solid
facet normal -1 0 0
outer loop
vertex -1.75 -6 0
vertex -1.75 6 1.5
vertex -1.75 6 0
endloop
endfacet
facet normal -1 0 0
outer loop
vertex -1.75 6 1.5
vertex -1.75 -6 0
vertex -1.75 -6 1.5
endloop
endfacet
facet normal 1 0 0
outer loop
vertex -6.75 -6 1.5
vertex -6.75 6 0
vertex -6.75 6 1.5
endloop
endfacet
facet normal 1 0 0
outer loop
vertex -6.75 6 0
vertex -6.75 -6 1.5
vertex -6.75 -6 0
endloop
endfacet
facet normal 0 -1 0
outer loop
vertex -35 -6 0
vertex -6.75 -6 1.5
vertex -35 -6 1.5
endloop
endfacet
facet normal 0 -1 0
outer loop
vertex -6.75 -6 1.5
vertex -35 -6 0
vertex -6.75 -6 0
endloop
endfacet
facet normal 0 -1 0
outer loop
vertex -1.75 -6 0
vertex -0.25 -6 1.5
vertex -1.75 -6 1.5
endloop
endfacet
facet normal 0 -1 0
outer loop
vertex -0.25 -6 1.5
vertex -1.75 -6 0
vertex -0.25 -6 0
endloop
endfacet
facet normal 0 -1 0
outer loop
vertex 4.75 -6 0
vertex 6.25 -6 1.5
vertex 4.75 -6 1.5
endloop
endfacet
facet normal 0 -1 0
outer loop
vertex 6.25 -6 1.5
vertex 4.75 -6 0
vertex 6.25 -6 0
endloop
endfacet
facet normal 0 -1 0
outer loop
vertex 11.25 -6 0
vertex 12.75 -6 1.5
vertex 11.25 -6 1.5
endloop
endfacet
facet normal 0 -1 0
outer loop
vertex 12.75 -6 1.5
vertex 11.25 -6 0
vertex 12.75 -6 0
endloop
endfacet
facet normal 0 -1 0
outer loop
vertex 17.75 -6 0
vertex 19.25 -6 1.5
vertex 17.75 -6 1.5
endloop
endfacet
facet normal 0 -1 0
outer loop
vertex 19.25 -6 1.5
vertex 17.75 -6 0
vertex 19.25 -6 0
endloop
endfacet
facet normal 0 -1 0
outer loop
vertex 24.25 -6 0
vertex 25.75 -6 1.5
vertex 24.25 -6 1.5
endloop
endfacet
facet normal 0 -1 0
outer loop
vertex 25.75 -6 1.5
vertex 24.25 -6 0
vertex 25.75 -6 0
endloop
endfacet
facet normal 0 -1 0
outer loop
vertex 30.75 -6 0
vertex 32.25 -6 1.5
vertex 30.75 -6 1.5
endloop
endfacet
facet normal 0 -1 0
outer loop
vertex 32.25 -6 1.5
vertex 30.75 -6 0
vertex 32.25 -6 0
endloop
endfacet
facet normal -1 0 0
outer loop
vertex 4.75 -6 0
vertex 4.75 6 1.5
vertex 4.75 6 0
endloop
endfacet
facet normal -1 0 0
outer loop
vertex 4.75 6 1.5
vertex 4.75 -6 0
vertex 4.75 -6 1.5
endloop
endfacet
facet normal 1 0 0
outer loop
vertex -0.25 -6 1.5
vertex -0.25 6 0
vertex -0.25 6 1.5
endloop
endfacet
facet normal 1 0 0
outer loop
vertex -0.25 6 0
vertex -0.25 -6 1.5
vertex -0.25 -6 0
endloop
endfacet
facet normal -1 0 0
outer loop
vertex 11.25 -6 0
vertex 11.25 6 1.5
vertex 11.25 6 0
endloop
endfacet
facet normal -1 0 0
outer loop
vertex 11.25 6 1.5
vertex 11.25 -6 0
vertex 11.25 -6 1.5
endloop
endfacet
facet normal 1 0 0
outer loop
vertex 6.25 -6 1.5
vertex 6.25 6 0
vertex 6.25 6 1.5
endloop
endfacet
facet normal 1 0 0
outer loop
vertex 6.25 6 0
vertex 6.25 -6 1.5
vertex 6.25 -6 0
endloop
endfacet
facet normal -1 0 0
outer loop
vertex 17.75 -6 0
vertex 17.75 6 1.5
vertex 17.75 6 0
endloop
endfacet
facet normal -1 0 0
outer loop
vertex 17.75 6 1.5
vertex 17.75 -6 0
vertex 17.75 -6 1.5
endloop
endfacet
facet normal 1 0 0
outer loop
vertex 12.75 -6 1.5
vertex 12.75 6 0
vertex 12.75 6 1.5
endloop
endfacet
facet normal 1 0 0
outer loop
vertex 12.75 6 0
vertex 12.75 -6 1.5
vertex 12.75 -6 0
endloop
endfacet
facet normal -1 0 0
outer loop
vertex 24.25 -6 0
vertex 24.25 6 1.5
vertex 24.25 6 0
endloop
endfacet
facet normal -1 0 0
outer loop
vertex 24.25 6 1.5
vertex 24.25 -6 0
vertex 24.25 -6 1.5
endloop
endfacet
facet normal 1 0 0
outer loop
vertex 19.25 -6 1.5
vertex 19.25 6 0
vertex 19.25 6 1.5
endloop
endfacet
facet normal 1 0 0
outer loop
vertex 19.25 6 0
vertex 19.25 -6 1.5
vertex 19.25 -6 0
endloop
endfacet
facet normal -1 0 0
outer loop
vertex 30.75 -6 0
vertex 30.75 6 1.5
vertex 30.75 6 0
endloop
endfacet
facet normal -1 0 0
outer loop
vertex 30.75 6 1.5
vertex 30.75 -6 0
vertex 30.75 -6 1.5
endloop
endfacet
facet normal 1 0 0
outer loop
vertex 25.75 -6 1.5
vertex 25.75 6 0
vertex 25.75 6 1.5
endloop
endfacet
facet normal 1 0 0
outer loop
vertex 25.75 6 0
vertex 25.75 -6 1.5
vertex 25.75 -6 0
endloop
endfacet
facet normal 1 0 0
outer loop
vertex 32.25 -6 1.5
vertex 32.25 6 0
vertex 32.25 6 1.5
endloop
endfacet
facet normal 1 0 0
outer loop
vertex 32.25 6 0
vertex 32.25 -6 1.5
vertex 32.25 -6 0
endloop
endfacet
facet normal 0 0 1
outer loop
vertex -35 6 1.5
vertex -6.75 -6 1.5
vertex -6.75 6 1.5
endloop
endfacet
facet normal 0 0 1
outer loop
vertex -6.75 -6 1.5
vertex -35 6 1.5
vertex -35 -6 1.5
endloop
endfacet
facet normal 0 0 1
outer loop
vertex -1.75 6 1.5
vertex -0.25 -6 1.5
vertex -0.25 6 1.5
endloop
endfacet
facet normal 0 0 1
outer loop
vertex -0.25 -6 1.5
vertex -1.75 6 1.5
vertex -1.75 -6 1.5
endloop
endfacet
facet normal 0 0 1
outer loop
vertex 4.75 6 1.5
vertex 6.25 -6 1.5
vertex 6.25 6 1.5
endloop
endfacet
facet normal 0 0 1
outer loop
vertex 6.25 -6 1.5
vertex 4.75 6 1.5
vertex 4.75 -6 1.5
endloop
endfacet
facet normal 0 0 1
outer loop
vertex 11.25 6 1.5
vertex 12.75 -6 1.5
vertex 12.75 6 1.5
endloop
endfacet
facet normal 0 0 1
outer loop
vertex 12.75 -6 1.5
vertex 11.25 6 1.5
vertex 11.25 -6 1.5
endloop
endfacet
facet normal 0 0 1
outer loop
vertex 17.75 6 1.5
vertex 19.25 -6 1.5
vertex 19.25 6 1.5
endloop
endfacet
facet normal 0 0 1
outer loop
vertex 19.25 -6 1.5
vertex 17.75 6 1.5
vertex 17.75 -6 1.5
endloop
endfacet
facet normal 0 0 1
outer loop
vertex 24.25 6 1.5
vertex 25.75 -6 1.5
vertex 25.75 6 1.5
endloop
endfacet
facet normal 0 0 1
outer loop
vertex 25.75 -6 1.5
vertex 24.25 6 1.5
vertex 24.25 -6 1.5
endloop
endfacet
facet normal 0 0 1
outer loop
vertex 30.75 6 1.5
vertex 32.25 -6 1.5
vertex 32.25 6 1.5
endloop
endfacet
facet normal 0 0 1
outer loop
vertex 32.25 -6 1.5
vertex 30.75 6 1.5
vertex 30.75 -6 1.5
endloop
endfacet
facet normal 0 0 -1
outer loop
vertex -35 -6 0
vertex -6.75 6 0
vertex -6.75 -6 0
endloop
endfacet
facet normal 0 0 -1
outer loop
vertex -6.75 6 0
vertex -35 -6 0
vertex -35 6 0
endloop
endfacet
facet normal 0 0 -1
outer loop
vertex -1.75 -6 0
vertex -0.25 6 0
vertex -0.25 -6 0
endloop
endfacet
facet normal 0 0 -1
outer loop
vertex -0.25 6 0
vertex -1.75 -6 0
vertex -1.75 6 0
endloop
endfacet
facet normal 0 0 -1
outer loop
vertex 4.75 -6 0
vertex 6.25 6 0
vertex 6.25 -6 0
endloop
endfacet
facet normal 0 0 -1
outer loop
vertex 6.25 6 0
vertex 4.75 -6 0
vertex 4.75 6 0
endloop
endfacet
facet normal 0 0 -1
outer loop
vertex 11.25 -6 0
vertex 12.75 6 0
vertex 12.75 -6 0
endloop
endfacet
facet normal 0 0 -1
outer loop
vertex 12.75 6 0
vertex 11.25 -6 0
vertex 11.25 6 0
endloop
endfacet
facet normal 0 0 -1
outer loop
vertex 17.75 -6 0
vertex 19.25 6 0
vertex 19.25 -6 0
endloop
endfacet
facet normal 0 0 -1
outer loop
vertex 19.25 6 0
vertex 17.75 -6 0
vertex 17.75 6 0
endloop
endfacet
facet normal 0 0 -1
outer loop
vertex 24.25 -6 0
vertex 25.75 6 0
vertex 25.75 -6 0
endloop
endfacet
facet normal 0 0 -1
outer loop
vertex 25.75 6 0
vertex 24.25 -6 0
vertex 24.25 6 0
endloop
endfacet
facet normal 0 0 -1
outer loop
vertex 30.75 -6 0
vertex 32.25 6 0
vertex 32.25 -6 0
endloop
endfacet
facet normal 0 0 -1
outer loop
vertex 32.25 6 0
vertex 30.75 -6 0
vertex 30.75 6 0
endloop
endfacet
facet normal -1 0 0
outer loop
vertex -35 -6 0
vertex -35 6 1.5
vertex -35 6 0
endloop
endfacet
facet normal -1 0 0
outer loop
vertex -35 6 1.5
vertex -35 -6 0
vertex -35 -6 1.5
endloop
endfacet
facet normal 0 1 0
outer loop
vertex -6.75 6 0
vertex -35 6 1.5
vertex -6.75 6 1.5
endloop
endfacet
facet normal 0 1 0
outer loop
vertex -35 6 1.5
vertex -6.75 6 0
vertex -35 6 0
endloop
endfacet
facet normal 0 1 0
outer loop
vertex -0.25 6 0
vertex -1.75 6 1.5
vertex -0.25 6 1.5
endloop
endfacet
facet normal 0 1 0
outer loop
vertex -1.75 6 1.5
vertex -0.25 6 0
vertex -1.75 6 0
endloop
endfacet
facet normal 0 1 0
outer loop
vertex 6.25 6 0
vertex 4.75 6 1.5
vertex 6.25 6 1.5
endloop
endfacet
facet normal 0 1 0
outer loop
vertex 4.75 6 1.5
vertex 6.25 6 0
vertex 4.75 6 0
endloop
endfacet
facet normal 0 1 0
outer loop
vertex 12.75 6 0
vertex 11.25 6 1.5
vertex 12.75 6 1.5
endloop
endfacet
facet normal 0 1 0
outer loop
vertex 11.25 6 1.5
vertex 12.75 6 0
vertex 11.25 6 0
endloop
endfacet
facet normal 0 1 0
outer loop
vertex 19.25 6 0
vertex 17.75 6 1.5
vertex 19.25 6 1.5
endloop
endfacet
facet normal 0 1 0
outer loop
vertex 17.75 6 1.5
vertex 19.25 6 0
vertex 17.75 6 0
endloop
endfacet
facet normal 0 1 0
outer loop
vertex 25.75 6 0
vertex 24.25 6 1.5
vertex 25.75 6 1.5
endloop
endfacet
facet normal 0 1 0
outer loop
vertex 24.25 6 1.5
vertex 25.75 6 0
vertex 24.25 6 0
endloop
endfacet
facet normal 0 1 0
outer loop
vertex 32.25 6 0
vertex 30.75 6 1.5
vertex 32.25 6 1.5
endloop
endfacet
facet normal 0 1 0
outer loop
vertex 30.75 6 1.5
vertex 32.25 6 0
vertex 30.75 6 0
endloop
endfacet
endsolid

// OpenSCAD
// 10-well comb for casting agarose gels, printed lying flat
// Units: mm. Print orientation: flat on bed, teeth pointing -Y.

// ---------- Parameters ----------
spine_len      = 70;    // spine (back bar) length along X
spine_wid      = 12;    // spine width along Y
plate_thk      = 1.5;   // comb plate thickness along Z

tooth_count    = 10;    // number of teeth
tooth_w        = 5.0;   // tooth width along X
tooth_len      = 12;    // tooth length along Y
tooth_gap      = 1.5;   // gap between neighbouring teeth along X

eps            = 0.5;   // cutter overshoot past faces
$fn            = 64;    // curve resolution (no curves here, set per rules)

// ---------- Derived ----------
row_wid        = tooth_w * tooth_count + (tooth_count - 1) * tooth_gap;  // 55 mm
y0             = -tooth_len / 2;                                         // tooth start Y
x_start        = -(row_wid / 2 - (tooth_count * tooth_w) / 2);           // first tooth X

// ---------- Model ----------
difference() {
    // Base plate
    translate([-spine_len / 2, -spine_wid / 2, 0])
        cube([spine_len, spine_wid, plate_thk]);

    // Teeth cutters (extend past top and bottom faces)
    for (i = [0 : tooth_count - 1])
        translate([x_start + i * (tooth_w + tooth_gap), y0, -eps])
            cube([tooth_w, tooth_len + tooth_len, 2 * eps + plate_thk]);
}
